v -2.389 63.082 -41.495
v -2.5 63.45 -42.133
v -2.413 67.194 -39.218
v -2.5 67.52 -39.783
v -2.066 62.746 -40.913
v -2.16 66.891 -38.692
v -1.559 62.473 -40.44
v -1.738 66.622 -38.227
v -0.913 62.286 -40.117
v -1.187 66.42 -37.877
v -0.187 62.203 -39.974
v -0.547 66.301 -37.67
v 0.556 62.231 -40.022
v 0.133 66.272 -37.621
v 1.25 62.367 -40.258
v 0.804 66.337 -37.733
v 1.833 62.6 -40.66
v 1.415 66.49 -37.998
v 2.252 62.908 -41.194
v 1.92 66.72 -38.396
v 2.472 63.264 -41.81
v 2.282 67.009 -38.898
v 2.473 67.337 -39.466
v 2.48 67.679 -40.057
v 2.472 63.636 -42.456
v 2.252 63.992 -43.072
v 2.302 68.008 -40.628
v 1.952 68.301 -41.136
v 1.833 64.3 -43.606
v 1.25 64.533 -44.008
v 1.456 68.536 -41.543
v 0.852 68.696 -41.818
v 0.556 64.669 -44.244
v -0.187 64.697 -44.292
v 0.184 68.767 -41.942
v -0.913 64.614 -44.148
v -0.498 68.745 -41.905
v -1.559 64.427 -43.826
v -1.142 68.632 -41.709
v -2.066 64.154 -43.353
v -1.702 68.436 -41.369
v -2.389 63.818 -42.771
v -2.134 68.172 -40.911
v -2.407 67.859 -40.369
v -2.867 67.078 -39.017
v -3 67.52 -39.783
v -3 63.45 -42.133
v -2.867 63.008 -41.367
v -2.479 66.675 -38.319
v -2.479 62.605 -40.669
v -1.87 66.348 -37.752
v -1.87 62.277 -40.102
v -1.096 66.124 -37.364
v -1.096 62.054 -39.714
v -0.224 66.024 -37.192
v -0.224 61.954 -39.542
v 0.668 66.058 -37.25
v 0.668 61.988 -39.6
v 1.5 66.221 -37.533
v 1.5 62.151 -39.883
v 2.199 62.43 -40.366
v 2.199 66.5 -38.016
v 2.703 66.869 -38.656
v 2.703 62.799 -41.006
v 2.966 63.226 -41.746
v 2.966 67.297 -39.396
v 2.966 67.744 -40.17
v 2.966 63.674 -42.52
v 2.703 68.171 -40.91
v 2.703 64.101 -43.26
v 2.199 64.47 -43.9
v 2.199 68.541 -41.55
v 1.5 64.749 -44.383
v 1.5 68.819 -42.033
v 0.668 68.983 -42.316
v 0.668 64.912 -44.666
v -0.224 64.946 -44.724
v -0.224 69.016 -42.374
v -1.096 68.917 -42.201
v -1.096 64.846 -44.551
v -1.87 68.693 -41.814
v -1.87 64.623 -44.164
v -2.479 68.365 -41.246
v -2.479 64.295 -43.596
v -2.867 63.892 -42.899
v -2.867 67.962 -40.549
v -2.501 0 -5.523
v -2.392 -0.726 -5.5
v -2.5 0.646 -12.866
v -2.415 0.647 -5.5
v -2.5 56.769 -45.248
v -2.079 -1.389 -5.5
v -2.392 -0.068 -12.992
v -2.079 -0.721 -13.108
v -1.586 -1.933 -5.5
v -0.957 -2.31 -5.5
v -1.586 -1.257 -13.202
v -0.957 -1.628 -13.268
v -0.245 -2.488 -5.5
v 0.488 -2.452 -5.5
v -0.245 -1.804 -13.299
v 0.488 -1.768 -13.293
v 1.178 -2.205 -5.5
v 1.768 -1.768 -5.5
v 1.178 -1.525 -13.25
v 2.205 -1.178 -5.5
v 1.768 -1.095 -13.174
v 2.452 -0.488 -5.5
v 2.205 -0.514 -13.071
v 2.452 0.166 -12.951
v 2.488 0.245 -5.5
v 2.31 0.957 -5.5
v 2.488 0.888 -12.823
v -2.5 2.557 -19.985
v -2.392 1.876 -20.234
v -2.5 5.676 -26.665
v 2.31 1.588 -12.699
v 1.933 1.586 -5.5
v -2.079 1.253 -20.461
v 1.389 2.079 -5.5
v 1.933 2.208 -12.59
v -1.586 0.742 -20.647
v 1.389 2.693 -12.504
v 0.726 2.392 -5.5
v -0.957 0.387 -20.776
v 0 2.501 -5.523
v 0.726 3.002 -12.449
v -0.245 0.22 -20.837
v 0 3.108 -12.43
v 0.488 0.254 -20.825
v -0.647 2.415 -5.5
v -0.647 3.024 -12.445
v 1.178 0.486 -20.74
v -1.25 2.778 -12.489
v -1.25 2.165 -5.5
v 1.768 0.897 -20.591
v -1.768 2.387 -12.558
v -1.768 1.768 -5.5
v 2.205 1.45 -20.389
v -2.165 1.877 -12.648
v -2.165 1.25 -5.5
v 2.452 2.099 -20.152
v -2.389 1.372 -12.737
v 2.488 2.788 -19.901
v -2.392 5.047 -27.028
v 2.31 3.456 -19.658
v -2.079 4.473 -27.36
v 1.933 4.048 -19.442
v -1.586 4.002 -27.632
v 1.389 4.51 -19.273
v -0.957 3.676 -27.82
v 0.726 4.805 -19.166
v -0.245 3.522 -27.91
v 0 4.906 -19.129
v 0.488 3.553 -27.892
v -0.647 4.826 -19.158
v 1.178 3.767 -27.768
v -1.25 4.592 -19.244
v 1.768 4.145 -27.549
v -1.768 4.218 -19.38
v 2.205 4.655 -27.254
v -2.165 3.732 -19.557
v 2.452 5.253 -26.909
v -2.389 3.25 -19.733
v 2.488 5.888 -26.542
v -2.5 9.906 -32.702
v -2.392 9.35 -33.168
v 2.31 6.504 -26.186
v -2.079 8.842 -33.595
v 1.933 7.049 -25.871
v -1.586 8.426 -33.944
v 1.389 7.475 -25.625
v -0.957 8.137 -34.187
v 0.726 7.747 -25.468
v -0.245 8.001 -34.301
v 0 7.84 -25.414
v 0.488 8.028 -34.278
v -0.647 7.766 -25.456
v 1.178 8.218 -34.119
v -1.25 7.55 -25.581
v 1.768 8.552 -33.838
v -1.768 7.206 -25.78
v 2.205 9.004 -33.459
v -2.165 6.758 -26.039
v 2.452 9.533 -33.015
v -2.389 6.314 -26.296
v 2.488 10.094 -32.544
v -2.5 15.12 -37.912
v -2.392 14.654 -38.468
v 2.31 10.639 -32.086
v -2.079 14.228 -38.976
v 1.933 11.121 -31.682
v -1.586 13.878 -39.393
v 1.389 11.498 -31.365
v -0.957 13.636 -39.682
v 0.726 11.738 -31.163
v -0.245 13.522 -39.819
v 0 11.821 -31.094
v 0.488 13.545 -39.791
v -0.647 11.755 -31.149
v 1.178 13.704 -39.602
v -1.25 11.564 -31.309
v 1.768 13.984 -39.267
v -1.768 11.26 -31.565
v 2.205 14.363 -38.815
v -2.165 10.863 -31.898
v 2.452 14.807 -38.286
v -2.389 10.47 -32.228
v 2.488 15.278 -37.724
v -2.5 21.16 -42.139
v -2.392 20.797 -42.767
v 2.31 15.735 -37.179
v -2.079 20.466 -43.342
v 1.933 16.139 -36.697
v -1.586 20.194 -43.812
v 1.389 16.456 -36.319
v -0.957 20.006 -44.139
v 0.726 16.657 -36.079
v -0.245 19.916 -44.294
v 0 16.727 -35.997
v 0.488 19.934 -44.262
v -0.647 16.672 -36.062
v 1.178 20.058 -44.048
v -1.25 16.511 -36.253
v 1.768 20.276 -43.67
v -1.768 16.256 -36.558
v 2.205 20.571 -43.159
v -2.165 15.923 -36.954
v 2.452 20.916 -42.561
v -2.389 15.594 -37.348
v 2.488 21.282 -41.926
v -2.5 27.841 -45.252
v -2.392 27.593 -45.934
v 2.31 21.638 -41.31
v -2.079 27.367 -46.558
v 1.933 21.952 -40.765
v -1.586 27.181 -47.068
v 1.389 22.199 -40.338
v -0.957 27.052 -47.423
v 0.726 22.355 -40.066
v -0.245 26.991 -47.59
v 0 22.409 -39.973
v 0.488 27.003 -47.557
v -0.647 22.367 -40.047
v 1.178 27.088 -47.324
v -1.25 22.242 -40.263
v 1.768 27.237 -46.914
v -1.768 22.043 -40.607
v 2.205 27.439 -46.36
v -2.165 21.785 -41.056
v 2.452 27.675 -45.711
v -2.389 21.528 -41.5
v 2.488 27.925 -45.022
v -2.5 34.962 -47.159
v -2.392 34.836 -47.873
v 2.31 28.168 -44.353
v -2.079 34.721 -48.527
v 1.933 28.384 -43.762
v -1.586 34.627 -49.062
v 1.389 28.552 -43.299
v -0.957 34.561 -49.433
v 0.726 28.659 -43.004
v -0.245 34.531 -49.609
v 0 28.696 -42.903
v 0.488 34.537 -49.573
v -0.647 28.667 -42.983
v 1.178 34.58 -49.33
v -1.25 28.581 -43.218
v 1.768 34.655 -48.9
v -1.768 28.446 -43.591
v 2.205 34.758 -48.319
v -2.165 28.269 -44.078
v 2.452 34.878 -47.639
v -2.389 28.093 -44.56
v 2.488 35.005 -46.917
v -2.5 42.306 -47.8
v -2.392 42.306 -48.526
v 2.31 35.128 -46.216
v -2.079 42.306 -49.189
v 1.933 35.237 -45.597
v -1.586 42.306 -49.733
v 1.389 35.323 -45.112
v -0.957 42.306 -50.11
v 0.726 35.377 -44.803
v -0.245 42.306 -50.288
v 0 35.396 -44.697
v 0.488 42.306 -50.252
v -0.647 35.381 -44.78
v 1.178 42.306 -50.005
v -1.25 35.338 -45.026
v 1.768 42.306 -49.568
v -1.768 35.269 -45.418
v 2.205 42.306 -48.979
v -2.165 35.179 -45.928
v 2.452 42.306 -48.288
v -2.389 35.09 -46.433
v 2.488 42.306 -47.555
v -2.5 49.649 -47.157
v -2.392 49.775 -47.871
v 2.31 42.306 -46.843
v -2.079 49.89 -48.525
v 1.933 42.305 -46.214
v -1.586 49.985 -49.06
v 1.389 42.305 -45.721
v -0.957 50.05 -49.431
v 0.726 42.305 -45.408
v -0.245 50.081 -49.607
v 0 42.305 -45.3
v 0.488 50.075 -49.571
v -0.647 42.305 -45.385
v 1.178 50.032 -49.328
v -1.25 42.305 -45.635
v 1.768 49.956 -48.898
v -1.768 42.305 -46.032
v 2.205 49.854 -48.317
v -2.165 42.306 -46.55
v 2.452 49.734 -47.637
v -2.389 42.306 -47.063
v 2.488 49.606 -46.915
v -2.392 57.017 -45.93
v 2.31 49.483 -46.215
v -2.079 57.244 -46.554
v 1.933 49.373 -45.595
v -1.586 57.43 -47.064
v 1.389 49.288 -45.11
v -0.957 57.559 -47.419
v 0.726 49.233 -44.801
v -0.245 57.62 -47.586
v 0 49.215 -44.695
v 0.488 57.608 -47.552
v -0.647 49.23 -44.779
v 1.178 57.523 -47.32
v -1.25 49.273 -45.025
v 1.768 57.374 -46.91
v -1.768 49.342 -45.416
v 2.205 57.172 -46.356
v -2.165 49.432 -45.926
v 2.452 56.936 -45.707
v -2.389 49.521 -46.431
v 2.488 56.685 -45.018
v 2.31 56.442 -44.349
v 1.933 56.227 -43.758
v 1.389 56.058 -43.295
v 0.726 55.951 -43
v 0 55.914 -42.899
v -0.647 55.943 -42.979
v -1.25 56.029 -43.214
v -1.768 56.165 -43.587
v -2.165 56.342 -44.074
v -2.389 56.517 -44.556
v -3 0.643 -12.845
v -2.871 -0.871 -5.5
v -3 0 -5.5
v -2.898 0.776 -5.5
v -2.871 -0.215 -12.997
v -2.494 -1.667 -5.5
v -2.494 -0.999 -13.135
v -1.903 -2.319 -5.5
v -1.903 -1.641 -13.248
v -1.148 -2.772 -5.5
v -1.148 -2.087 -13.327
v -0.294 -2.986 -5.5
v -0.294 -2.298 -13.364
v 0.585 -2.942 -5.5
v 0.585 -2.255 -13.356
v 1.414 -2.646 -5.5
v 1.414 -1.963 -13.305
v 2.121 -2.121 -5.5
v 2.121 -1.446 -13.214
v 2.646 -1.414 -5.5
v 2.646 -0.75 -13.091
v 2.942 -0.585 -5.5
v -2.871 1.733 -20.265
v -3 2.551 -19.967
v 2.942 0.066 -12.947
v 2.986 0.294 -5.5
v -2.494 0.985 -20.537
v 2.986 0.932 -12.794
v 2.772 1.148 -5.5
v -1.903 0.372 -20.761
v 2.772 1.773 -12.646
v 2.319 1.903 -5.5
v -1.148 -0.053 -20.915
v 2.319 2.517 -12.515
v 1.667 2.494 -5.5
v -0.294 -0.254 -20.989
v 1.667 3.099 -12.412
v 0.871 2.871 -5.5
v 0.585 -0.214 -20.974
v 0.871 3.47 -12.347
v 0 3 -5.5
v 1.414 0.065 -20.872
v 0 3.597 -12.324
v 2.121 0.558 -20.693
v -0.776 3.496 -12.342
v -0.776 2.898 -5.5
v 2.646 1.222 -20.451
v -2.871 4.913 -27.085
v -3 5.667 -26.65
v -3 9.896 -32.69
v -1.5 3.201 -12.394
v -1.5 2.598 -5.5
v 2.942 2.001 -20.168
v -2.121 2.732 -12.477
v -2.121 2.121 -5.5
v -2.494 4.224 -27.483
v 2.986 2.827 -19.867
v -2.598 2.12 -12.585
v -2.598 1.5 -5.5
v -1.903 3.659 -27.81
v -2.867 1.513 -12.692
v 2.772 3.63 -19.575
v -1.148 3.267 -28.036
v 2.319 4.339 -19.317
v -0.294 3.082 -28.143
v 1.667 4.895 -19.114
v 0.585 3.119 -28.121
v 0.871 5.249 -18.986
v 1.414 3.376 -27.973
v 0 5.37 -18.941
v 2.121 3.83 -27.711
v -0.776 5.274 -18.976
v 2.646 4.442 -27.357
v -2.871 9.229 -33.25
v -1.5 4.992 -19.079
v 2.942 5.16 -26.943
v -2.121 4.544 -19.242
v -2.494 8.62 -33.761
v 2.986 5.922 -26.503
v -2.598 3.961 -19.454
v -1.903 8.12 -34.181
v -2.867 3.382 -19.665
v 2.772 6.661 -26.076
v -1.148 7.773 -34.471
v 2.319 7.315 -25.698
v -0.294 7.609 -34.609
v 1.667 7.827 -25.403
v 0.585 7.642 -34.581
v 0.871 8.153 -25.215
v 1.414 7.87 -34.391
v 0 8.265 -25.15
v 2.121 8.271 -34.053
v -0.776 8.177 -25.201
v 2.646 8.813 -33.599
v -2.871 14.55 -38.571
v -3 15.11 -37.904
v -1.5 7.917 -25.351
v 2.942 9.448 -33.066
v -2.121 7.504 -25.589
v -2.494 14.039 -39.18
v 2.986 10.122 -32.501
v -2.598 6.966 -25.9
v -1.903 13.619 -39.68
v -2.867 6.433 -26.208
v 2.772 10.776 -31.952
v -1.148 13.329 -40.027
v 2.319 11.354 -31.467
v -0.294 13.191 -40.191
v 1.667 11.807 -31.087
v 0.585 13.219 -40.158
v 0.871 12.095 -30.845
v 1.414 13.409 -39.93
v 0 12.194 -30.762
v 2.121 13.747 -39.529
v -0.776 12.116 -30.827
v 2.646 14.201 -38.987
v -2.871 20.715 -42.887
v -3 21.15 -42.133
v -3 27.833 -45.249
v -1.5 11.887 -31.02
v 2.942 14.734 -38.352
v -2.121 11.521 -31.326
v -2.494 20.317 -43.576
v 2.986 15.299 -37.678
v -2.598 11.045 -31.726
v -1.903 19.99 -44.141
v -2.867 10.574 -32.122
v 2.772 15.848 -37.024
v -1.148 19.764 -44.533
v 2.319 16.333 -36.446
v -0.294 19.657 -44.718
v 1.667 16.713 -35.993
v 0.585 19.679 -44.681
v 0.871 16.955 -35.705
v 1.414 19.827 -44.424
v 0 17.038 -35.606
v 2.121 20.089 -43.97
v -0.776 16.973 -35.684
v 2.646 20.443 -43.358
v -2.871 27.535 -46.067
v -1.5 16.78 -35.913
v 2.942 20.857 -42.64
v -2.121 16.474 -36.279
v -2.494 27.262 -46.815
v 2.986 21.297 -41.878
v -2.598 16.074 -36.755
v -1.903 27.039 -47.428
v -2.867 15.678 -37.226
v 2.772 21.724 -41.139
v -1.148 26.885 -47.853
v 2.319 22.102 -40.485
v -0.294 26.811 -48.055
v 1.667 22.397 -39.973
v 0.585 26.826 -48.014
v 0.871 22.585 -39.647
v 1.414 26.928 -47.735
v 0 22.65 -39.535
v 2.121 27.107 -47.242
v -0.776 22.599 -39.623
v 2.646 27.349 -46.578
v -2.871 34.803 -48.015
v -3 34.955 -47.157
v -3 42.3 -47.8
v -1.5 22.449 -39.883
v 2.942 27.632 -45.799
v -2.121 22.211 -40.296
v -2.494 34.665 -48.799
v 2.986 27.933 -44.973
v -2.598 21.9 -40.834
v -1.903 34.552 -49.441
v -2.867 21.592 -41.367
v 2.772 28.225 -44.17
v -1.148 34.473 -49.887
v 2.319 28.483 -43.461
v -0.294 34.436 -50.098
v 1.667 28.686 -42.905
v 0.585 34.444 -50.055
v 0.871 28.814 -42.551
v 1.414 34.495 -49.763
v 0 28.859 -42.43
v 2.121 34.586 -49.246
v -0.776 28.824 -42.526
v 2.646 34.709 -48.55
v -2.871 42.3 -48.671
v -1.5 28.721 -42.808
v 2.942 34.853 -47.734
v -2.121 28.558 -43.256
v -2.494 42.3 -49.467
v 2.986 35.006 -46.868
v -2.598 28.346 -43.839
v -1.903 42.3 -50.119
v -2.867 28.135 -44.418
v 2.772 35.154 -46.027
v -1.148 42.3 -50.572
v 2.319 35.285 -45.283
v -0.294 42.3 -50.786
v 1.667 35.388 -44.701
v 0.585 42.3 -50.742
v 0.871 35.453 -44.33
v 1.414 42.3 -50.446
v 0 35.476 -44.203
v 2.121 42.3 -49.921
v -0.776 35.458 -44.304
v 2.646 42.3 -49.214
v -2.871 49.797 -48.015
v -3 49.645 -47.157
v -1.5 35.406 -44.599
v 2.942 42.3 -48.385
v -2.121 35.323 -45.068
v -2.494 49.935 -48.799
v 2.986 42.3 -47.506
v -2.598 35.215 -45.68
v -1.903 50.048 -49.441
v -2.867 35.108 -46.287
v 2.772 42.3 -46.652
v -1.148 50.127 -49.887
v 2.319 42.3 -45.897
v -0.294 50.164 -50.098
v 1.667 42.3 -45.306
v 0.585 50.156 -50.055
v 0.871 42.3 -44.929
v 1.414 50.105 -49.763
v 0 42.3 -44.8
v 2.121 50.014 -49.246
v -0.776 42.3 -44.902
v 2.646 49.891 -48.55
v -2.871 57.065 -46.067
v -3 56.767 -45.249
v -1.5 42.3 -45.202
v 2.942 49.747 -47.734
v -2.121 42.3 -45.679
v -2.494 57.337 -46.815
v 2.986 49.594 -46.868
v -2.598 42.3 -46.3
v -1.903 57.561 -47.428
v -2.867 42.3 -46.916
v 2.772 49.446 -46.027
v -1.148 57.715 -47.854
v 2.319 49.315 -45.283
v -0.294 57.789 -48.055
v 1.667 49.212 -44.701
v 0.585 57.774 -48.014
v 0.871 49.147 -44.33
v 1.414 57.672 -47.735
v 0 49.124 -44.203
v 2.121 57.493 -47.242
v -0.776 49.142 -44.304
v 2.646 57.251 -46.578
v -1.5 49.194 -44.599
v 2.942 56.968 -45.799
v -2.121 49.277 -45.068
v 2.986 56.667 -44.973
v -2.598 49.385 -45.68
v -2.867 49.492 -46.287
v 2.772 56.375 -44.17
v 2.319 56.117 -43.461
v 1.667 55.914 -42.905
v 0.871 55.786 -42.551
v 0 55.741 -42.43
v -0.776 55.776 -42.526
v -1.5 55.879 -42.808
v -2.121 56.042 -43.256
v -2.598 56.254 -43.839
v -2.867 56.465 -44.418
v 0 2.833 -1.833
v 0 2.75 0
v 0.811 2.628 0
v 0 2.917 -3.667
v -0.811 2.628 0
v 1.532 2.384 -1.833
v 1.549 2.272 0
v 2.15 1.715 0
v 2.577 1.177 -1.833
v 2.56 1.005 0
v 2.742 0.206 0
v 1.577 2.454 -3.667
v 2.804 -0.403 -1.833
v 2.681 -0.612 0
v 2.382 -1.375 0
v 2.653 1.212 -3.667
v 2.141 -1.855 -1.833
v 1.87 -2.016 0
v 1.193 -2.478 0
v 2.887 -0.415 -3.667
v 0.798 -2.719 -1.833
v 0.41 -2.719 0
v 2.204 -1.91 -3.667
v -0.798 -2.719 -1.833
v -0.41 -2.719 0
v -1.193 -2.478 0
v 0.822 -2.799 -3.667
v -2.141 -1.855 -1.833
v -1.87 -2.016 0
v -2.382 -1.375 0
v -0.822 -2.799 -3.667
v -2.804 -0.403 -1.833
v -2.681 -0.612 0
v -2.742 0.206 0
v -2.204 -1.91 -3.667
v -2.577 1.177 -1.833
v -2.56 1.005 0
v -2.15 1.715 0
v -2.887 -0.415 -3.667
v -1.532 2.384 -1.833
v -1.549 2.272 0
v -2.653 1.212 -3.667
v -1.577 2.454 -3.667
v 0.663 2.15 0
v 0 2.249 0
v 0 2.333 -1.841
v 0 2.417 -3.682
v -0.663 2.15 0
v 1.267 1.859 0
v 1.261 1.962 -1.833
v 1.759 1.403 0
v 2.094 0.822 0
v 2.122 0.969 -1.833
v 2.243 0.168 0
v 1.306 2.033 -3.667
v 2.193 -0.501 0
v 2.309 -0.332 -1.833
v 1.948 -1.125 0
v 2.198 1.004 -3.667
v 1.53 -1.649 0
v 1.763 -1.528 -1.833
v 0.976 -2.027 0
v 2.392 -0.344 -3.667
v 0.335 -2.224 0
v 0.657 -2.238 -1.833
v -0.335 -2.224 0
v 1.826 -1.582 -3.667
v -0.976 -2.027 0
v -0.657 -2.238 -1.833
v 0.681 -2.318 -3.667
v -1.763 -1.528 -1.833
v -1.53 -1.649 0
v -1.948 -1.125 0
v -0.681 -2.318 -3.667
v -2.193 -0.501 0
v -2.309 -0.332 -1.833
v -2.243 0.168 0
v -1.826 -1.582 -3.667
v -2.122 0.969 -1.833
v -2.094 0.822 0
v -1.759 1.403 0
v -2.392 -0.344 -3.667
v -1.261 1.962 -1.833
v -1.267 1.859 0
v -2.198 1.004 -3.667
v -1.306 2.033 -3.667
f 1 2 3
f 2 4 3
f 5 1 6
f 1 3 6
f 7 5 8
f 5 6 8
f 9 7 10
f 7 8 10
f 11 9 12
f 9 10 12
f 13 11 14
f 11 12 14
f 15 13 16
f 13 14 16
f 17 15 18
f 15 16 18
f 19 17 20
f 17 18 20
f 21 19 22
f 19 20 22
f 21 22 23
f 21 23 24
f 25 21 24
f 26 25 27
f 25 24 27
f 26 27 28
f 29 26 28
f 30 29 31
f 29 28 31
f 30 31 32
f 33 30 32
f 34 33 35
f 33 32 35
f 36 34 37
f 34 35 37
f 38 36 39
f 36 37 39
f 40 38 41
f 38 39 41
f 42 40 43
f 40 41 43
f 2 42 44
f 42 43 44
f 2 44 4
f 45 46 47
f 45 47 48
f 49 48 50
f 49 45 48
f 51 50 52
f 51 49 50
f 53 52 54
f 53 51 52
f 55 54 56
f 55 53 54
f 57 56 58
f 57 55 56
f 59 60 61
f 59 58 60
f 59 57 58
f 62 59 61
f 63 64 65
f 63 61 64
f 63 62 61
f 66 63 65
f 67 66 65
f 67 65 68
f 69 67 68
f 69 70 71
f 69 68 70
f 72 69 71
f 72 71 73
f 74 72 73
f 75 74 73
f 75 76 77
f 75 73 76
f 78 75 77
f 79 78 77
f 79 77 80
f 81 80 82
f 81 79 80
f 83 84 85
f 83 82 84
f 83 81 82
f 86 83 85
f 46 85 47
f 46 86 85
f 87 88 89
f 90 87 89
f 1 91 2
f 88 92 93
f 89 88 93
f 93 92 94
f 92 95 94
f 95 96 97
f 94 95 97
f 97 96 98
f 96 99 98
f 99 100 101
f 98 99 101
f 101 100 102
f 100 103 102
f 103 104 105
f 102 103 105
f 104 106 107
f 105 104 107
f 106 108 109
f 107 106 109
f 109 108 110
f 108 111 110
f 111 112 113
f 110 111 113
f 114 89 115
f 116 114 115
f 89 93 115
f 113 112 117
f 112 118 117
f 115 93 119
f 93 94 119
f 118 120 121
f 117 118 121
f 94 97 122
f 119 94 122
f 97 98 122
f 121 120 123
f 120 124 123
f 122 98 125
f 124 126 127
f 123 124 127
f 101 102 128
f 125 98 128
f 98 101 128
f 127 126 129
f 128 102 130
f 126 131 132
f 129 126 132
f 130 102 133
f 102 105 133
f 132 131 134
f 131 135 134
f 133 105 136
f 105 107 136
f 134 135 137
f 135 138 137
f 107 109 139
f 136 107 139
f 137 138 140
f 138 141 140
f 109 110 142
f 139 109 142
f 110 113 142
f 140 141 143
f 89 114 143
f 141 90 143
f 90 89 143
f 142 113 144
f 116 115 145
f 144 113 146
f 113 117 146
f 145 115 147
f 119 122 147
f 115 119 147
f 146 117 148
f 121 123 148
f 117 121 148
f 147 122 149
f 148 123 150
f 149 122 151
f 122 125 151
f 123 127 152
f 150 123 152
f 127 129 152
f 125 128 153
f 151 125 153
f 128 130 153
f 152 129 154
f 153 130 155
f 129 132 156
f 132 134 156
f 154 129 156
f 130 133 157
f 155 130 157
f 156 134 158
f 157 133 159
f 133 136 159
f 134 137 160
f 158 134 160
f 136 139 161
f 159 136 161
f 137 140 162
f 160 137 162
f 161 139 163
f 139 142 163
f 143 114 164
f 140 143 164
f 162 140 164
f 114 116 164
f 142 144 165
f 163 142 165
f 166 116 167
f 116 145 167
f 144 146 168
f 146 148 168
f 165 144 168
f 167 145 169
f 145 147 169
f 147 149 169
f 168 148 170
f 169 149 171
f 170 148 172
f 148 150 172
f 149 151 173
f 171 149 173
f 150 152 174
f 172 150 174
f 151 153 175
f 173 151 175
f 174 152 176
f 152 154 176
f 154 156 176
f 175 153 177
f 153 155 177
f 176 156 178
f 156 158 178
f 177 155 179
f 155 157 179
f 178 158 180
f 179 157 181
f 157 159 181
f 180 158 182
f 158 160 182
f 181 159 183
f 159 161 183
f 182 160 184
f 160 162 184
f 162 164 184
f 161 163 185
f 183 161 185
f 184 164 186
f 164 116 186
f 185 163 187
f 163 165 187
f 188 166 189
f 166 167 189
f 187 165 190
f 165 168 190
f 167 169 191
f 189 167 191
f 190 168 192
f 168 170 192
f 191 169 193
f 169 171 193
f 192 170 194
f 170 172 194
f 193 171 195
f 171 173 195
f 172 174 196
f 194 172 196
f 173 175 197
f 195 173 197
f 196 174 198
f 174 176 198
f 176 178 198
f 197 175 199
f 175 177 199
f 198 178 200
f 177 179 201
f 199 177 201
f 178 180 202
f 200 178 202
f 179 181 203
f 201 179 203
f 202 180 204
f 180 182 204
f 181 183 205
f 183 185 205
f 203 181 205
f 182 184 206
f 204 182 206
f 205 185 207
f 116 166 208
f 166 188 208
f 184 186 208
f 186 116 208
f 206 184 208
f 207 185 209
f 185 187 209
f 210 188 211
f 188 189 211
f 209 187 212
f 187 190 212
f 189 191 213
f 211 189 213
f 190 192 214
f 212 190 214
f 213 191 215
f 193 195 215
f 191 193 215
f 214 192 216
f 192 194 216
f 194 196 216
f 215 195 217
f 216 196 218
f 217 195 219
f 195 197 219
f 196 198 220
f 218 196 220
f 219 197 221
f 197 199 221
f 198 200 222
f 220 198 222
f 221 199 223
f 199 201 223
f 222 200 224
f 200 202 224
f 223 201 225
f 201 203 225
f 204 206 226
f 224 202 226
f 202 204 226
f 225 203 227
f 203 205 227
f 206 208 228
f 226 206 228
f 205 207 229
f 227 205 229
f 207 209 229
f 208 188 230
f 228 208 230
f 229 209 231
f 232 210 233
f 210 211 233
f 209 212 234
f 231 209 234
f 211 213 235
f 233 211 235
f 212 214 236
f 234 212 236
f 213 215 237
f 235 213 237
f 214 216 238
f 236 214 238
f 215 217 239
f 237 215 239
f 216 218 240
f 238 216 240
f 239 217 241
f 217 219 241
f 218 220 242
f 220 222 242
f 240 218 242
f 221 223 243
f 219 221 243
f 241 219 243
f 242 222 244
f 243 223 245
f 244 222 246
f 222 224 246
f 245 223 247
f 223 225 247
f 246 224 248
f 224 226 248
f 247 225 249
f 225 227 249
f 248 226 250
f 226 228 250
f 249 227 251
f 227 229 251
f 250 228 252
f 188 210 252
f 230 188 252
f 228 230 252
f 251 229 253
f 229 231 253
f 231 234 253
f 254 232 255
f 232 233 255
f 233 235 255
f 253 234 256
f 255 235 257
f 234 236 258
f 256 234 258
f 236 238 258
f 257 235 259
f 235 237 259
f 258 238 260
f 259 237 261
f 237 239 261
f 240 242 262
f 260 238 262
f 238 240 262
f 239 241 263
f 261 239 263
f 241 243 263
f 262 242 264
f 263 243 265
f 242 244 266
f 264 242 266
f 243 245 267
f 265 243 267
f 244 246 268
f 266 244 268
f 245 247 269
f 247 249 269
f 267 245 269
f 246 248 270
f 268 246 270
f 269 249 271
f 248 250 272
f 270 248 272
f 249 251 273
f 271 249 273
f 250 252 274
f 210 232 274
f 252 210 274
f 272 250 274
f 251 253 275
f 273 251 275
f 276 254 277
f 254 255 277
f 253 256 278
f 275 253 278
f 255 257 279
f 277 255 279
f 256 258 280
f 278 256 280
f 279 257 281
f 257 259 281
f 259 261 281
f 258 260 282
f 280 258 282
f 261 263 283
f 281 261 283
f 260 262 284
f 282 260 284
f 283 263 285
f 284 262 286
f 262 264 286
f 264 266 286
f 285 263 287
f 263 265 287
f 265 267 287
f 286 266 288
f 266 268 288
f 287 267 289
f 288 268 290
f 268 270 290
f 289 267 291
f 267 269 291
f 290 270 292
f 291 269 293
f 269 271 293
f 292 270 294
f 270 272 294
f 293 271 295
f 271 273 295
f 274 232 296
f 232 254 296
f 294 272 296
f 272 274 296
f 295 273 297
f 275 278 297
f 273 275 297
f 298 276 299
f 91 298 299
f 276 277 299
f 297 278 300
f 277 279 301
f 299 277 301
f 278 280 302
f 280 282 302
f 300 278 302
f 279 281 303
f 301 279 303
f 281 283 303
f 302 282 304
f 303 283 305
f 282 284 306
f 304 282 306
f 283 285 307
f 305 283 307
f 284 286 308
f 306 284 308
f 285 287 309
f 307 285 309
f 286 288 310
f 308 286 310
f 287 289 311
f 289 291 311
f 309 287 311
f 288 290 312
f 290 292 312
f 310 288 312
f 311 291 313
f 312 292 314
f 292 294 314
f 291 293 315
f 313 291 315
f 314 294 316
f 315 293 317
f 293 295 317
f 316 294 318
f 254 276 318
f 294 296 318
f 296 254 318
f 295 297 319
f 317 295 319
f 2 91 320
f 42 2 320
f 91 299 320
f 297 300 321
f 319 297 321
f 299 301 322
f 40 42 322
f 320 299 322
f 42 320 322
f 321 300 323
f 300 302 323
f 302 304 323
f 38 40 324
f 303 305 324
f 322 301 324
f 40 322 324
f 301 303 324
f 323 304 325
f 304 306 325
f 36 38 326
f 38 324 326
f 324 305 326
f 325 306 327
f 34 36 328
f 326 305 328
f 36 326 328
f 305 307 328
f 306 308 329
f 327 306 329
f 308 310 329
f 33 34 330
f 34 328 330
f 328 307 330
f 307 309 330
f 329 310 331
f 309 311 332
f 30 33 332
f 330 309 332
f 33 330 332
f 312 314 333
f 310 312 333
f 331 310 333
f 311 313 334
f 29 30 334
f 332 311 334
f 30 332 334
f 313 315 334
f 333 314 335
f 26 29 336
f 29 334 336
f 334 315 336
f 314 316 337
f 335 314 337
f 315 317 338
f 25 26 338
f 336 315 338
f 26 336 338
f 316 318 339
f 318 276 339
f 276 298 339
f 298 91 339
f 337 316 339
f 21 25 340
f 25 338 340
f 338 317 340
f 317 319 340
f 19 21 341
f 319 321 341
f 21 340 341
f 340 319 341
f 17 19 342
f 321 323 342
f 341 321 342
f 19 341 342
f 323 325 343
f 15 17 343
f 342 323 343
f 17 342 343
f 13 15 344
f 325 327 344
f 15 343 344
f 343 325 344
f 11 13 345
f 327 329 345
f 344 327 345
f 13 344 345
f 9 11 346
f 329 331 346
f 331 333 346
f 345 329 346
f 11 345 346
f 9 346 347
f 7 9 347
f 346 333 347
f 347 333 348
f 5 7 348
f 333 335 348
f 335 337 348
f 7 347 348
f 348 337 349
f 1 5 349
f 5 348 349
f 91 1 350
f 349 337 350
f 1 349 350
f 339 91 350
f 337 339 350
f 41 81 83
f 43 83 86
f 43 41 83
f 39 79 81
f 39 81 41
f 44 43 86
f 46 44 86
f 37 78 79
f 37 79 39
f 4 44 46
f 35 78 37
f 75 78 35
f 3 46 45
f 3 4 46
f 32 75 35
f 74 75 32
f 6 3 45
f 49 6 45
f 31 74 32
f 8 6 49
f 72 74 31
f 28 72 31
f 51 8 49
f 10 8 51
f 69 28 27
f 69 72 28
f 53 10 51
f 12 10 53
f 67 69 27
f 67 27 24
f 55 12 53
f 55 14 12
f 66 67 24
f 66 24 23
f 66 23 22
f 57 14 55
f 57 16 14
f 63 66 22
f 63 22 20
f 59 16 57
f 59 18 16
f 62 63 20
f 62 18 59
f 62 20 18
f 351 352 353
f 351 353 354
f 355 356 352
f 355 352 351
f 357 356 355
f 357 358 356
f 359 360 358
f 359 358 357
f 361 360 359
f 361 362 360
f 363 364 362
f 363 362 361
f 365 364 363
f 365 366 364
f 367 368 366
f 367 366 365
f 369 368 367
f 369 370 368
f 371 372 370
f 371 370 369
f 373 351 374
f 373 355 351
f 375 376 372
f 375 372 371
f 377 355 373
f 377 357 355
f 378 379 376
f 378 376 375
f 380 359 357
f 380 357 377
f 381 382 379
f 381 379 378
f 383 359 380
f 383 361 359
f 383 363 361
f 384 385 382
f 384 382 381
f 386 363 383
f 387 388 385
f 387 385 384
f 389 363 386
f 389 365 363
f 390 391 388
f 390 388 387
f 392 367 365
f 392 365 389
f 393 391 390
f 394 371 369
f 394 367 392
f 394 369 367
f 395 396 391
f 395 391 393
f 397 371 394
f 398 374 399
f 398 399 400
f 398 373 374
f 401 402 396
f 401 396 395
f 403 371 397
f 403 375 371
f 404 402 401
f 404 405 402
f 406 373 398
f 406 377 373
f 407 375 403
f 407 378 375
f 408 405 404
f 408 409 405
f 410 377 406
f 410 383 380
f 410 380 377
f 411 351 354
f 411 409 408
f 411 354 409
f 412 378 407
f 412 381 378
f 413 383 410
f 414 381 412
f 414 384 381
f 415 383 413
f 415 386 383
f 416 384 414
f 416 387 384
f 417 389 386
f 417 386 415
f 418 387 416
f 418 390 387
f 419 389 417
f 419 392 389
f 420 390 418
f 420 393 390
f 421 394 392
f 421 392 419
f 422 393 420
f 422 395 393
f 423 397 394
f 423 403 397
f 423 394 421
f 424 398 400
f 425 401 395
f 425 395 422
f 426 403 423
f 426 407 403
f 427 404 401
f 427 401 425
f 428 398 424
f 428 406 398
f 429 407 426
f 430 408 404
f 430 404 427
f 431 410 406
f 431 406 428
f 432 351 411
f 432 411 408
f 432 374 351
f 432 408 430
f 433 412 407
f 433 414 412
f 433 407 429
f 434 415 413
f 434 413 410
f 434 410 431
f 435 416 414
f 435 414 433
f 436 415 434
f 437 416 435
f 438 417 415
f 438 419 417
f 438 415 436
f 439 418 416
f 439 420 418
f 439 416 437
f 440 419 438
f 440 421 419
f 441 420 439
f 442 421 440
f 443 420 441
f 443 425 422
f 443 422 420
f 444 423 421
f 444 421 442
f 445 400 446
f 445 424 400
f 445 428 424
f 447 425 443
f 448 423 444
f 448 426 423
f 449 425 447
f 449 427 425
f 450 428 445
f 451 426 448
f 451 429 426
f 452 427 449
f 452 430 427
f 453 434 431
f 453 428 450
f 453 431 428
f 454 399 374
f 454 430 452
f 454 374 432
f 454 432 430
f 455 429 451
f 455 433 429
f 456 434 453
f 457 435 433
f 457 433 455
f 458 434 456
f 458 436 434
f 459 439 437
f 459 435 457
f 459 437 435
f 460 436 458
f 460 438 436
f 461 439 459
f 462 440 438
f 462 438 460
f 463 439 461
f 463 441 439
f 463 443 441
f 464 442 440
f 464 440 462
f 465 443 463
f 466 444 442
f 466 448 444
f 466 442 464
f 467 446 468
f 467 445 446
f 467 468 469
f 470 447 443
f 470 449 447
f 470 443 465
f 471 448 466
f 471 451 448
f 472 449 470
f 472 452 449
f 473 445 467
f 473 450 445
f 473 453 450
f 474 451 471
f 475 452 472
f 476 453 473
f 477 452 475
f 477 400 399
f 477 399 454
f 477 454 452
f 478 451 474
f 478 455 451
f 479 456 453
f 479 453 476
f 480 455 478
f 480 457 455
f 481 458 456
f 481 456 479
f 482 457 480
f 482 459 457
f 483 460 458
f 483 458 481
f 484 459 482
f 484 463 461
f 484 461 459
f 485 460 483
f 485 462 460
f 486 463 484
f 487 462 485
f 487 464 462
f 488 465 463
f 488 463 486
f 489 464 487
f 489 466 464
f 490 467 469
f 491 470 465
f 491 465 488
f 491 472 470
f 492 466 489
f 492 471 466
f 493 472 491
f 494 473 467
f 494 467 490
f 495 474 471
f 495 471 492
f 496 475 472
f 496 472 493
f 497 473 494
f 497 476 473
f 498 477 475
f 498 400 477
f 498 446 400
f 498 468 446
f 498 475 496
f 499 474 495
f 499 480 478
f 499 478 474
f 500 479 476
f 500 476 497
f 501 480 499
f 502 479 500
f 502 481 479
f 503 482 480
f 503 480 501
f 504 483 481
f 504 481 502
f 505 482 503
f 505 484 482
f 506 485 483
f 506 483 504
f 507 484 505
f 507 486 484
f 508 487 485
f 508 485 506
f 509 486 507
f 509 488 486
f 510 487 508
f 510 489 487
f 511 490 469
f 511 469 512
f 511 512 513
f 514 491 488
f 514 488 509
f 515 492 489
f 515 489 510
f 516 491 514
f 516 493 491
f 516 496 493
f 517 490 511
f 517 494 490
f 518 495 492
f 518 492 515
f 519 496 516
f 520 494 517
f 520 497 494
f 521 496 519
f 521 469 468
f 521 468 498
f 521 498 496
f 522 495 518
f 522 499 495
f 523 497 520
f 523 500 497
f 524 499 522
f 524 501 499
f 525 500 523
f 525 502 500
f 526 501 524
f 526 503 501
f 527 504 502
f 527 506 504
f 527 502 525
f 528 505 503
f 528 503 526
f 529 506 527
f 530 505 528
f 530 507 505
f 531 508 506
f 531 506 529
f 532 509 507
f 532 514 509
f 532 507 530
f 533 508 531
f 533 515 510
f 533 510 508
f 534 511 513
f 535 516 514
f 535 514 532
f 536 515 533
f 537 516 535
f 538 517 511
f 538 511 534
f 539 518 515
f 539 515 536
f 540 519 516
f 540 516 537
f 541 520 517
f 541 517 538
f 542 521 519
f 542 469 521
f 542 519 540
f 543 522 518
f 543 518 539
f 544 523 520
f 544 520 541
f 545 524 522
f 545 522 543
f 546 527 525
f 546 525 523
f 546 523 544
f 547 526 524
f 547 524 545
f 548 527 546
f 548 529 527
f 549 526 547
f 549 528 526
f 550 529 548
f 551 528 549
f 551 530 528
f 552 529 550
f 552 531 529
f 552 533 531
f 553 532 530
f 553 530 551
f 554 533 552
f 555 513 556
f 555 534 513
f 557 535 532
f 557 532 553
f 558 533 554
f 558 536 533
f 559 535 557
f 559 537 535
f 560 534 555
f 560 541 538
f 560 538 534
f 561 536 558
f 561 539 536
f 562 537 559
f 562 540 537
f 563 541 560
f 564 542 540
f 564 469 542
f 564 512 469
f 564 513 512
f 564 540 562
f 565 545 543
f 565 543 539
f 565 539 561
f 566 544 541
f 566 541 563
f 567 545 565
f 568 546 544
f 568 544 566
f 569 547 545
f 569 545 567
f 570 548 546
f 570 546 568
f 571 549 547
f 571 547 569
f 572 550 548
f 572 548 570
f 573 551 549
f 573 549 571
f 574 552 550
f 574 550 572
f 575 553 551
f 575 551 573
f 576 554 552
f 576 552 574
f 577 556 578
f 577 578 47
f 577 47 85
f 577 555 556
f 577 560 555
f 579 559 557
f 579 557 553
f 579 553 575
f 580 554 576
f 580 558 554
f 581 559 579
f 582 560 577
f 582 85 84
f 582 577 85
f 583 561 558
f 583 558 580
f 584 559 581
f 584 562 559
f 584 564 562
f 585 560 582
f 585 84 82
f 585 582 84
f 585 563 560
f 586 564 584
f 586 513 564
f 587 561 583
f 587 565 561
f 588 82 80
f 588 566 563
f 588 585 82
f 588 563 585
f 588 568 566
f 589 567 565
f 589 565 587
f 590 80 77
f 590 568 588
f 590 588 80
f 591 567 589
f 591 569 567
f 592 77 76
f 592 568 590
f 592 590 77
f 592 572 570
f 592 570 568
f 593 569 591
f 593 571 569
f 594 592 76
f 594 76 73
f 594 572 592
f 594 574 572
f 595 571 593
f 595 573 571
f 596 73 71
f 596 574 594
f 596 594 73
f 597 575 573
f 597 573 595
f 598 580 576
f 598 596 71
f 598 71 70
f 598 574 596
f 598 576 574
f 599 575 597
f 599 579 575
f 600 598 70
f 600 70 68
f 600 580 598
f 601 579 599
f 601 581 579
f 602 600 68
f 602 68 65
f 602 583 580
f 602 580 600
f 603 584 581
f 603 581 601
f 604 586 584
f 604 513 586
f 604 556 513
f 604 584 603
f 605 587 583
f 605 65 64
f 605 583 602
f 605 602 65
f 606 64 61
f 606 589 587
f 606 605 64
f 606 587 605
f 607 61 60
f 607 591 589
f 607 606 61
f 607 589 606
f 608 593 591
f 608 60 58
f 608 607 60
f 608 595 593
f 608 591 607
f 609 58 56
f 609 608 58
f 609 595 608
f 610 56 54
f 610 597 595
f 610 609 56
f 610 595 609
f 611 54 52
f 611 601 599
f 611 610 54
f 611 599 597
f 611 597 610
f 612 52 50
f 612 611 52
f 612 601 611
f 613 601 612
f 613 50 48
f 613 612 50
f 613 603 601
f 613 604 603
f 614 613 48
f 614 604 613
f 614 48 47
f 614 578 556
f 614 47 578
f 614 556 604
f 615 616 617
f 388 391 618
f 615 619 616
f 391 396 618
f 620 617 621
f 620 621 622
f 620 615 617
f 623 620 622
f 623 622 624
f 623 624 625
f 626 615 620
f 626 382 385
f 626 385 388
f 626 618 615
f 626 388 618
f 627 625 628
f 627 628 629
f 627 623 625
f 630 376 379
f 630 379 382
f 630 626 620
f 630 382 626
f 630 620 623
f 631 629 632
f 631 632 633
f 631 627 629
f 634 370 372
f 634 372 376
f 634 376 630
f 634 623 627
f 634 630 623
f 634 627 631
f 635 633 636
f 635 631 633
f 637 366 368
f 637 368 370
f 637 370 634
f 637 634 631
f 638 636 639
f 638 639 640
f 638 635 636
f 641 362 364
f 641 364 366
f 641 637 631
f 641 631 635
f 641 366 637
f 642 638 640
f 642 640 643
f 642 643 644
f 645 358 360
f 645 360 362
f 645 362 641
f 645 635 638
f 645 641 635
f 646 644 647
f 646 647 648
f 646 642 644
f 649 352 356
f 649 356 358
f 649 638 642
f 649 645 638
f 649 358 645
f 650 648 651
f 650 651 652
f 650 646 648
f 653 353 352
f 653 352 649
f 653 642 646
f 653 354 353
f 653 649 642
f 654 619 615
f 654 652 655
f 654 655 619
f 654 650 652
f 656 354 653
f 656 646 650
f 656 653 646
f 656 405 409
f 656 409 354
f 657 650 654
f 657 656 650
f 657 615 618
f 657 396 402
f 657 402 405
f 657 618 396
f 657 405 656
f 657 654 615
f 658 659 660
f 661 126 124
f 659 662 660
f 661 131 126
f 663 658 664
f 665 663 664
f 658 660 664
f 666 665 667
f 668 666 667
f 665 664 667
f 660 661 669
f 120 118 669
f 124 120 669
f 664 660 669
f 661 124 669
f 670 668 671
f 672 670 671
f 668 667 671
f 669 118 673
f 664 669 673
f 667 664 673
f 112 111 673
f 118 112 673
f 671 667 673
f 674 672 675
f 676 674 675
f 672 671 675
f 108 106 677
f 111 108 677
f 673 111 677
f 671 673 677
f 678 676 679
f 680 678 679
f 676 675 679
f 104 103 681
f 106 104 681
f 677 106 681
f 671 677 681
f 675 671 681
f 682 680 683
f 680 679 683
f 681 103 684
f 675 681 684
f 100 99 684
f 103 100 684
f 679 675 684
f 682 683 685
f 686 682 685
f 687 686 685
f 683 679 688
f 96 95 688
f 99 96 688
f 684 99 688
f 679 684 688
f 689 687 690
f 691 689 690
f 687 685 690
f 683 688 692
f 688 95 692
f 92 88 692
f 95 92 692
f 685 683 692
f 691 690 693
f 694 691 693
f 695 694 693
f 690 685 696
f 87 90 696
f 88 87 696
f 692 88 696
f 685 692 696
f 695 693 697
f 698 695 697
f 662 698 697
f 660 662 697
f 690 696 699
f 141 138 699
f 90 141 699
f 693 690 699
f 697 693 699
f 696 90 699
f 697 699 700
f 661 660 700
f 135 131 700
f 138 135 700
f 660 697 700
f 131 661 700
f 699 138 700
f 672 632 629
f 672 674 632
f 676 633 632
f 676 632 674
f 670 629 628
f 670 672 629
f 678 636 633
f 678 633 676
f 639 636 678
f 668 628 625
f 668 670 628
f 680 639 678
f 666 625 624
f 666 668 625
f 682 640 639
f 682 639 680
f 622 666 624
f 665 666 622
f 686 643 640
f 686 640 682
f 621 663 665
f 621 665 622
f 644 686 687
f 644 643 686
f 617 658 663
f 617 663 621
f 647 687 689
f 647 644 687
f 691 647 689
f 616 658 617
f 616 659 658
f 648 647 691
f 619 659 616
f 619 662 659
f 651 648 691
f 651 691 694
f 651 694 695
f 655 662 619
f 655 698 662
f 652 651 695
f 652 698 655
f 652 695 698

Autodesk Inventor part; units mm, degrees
ref_plane "YZ Plane" through (0, 0, 0) normal (1, 0, 0) x (0, 1, 0)
sketch "Skizze1" plane through (0, 0, 0) normal (0, 0, 1) x (0, 1, 0)
  circle A0 centre (0, 0) radius 2.75
  dimension "d0" = 5.5
sketch "Skizze2" plane through (0, 0, 0) normal (1, 0, 0) x (0, 1, 0)
  arc A0 (0, -5.5) -> (63.45, -42.1329) centre (42.3, -5.5) ccw
  line L0 (63.45, -42.1329) -> (67.5203, -39.7829)
  line L1 (42.3, -5.5) -> (42.3, -47.8) construction
  point P0 (0, 0)
  point P1 (0, 0)
  dimension "d3" = 5.5
  dimension "d4" = 42.3
  dimension "d5" = 4.7
  dimension "d27" = 60
ref_plane "Arbeitsebene1" through (0, 0, -5.5) normal (0, 0, 1) x (1, 0, 0)
sketch "Skizze3" plane through (0, 0, -5.5) normal (0, 0, 1) x (1, 0, 0)
  circle A0 centre (0, 0) radius 3
  dimension "d11" = 6
ref_plane "Arbeitsebene2" through (0, 0, -5.5) normal (0, 0, -1) x (-1, 0, 0)
sketch "Skizze4" plane through (0, 0, -5.5) normal (0, 0, -1) x (-1, 0, 0)
  circle A0 centre (0, 0) radius 3 projected
loft "Erhebung2" add profiles "Skizze1", "Skizze3"
sweep "Sweeping3" add profiles "Skizze4" path "Skizze2"
shell "Wandung2" thickness 0.5 removed faces 2 at (-0.6079, 0.6861, 0) at (-0.7485, 67.8519, -40.3572)
properties part number "Tube" material "Kupfer"
